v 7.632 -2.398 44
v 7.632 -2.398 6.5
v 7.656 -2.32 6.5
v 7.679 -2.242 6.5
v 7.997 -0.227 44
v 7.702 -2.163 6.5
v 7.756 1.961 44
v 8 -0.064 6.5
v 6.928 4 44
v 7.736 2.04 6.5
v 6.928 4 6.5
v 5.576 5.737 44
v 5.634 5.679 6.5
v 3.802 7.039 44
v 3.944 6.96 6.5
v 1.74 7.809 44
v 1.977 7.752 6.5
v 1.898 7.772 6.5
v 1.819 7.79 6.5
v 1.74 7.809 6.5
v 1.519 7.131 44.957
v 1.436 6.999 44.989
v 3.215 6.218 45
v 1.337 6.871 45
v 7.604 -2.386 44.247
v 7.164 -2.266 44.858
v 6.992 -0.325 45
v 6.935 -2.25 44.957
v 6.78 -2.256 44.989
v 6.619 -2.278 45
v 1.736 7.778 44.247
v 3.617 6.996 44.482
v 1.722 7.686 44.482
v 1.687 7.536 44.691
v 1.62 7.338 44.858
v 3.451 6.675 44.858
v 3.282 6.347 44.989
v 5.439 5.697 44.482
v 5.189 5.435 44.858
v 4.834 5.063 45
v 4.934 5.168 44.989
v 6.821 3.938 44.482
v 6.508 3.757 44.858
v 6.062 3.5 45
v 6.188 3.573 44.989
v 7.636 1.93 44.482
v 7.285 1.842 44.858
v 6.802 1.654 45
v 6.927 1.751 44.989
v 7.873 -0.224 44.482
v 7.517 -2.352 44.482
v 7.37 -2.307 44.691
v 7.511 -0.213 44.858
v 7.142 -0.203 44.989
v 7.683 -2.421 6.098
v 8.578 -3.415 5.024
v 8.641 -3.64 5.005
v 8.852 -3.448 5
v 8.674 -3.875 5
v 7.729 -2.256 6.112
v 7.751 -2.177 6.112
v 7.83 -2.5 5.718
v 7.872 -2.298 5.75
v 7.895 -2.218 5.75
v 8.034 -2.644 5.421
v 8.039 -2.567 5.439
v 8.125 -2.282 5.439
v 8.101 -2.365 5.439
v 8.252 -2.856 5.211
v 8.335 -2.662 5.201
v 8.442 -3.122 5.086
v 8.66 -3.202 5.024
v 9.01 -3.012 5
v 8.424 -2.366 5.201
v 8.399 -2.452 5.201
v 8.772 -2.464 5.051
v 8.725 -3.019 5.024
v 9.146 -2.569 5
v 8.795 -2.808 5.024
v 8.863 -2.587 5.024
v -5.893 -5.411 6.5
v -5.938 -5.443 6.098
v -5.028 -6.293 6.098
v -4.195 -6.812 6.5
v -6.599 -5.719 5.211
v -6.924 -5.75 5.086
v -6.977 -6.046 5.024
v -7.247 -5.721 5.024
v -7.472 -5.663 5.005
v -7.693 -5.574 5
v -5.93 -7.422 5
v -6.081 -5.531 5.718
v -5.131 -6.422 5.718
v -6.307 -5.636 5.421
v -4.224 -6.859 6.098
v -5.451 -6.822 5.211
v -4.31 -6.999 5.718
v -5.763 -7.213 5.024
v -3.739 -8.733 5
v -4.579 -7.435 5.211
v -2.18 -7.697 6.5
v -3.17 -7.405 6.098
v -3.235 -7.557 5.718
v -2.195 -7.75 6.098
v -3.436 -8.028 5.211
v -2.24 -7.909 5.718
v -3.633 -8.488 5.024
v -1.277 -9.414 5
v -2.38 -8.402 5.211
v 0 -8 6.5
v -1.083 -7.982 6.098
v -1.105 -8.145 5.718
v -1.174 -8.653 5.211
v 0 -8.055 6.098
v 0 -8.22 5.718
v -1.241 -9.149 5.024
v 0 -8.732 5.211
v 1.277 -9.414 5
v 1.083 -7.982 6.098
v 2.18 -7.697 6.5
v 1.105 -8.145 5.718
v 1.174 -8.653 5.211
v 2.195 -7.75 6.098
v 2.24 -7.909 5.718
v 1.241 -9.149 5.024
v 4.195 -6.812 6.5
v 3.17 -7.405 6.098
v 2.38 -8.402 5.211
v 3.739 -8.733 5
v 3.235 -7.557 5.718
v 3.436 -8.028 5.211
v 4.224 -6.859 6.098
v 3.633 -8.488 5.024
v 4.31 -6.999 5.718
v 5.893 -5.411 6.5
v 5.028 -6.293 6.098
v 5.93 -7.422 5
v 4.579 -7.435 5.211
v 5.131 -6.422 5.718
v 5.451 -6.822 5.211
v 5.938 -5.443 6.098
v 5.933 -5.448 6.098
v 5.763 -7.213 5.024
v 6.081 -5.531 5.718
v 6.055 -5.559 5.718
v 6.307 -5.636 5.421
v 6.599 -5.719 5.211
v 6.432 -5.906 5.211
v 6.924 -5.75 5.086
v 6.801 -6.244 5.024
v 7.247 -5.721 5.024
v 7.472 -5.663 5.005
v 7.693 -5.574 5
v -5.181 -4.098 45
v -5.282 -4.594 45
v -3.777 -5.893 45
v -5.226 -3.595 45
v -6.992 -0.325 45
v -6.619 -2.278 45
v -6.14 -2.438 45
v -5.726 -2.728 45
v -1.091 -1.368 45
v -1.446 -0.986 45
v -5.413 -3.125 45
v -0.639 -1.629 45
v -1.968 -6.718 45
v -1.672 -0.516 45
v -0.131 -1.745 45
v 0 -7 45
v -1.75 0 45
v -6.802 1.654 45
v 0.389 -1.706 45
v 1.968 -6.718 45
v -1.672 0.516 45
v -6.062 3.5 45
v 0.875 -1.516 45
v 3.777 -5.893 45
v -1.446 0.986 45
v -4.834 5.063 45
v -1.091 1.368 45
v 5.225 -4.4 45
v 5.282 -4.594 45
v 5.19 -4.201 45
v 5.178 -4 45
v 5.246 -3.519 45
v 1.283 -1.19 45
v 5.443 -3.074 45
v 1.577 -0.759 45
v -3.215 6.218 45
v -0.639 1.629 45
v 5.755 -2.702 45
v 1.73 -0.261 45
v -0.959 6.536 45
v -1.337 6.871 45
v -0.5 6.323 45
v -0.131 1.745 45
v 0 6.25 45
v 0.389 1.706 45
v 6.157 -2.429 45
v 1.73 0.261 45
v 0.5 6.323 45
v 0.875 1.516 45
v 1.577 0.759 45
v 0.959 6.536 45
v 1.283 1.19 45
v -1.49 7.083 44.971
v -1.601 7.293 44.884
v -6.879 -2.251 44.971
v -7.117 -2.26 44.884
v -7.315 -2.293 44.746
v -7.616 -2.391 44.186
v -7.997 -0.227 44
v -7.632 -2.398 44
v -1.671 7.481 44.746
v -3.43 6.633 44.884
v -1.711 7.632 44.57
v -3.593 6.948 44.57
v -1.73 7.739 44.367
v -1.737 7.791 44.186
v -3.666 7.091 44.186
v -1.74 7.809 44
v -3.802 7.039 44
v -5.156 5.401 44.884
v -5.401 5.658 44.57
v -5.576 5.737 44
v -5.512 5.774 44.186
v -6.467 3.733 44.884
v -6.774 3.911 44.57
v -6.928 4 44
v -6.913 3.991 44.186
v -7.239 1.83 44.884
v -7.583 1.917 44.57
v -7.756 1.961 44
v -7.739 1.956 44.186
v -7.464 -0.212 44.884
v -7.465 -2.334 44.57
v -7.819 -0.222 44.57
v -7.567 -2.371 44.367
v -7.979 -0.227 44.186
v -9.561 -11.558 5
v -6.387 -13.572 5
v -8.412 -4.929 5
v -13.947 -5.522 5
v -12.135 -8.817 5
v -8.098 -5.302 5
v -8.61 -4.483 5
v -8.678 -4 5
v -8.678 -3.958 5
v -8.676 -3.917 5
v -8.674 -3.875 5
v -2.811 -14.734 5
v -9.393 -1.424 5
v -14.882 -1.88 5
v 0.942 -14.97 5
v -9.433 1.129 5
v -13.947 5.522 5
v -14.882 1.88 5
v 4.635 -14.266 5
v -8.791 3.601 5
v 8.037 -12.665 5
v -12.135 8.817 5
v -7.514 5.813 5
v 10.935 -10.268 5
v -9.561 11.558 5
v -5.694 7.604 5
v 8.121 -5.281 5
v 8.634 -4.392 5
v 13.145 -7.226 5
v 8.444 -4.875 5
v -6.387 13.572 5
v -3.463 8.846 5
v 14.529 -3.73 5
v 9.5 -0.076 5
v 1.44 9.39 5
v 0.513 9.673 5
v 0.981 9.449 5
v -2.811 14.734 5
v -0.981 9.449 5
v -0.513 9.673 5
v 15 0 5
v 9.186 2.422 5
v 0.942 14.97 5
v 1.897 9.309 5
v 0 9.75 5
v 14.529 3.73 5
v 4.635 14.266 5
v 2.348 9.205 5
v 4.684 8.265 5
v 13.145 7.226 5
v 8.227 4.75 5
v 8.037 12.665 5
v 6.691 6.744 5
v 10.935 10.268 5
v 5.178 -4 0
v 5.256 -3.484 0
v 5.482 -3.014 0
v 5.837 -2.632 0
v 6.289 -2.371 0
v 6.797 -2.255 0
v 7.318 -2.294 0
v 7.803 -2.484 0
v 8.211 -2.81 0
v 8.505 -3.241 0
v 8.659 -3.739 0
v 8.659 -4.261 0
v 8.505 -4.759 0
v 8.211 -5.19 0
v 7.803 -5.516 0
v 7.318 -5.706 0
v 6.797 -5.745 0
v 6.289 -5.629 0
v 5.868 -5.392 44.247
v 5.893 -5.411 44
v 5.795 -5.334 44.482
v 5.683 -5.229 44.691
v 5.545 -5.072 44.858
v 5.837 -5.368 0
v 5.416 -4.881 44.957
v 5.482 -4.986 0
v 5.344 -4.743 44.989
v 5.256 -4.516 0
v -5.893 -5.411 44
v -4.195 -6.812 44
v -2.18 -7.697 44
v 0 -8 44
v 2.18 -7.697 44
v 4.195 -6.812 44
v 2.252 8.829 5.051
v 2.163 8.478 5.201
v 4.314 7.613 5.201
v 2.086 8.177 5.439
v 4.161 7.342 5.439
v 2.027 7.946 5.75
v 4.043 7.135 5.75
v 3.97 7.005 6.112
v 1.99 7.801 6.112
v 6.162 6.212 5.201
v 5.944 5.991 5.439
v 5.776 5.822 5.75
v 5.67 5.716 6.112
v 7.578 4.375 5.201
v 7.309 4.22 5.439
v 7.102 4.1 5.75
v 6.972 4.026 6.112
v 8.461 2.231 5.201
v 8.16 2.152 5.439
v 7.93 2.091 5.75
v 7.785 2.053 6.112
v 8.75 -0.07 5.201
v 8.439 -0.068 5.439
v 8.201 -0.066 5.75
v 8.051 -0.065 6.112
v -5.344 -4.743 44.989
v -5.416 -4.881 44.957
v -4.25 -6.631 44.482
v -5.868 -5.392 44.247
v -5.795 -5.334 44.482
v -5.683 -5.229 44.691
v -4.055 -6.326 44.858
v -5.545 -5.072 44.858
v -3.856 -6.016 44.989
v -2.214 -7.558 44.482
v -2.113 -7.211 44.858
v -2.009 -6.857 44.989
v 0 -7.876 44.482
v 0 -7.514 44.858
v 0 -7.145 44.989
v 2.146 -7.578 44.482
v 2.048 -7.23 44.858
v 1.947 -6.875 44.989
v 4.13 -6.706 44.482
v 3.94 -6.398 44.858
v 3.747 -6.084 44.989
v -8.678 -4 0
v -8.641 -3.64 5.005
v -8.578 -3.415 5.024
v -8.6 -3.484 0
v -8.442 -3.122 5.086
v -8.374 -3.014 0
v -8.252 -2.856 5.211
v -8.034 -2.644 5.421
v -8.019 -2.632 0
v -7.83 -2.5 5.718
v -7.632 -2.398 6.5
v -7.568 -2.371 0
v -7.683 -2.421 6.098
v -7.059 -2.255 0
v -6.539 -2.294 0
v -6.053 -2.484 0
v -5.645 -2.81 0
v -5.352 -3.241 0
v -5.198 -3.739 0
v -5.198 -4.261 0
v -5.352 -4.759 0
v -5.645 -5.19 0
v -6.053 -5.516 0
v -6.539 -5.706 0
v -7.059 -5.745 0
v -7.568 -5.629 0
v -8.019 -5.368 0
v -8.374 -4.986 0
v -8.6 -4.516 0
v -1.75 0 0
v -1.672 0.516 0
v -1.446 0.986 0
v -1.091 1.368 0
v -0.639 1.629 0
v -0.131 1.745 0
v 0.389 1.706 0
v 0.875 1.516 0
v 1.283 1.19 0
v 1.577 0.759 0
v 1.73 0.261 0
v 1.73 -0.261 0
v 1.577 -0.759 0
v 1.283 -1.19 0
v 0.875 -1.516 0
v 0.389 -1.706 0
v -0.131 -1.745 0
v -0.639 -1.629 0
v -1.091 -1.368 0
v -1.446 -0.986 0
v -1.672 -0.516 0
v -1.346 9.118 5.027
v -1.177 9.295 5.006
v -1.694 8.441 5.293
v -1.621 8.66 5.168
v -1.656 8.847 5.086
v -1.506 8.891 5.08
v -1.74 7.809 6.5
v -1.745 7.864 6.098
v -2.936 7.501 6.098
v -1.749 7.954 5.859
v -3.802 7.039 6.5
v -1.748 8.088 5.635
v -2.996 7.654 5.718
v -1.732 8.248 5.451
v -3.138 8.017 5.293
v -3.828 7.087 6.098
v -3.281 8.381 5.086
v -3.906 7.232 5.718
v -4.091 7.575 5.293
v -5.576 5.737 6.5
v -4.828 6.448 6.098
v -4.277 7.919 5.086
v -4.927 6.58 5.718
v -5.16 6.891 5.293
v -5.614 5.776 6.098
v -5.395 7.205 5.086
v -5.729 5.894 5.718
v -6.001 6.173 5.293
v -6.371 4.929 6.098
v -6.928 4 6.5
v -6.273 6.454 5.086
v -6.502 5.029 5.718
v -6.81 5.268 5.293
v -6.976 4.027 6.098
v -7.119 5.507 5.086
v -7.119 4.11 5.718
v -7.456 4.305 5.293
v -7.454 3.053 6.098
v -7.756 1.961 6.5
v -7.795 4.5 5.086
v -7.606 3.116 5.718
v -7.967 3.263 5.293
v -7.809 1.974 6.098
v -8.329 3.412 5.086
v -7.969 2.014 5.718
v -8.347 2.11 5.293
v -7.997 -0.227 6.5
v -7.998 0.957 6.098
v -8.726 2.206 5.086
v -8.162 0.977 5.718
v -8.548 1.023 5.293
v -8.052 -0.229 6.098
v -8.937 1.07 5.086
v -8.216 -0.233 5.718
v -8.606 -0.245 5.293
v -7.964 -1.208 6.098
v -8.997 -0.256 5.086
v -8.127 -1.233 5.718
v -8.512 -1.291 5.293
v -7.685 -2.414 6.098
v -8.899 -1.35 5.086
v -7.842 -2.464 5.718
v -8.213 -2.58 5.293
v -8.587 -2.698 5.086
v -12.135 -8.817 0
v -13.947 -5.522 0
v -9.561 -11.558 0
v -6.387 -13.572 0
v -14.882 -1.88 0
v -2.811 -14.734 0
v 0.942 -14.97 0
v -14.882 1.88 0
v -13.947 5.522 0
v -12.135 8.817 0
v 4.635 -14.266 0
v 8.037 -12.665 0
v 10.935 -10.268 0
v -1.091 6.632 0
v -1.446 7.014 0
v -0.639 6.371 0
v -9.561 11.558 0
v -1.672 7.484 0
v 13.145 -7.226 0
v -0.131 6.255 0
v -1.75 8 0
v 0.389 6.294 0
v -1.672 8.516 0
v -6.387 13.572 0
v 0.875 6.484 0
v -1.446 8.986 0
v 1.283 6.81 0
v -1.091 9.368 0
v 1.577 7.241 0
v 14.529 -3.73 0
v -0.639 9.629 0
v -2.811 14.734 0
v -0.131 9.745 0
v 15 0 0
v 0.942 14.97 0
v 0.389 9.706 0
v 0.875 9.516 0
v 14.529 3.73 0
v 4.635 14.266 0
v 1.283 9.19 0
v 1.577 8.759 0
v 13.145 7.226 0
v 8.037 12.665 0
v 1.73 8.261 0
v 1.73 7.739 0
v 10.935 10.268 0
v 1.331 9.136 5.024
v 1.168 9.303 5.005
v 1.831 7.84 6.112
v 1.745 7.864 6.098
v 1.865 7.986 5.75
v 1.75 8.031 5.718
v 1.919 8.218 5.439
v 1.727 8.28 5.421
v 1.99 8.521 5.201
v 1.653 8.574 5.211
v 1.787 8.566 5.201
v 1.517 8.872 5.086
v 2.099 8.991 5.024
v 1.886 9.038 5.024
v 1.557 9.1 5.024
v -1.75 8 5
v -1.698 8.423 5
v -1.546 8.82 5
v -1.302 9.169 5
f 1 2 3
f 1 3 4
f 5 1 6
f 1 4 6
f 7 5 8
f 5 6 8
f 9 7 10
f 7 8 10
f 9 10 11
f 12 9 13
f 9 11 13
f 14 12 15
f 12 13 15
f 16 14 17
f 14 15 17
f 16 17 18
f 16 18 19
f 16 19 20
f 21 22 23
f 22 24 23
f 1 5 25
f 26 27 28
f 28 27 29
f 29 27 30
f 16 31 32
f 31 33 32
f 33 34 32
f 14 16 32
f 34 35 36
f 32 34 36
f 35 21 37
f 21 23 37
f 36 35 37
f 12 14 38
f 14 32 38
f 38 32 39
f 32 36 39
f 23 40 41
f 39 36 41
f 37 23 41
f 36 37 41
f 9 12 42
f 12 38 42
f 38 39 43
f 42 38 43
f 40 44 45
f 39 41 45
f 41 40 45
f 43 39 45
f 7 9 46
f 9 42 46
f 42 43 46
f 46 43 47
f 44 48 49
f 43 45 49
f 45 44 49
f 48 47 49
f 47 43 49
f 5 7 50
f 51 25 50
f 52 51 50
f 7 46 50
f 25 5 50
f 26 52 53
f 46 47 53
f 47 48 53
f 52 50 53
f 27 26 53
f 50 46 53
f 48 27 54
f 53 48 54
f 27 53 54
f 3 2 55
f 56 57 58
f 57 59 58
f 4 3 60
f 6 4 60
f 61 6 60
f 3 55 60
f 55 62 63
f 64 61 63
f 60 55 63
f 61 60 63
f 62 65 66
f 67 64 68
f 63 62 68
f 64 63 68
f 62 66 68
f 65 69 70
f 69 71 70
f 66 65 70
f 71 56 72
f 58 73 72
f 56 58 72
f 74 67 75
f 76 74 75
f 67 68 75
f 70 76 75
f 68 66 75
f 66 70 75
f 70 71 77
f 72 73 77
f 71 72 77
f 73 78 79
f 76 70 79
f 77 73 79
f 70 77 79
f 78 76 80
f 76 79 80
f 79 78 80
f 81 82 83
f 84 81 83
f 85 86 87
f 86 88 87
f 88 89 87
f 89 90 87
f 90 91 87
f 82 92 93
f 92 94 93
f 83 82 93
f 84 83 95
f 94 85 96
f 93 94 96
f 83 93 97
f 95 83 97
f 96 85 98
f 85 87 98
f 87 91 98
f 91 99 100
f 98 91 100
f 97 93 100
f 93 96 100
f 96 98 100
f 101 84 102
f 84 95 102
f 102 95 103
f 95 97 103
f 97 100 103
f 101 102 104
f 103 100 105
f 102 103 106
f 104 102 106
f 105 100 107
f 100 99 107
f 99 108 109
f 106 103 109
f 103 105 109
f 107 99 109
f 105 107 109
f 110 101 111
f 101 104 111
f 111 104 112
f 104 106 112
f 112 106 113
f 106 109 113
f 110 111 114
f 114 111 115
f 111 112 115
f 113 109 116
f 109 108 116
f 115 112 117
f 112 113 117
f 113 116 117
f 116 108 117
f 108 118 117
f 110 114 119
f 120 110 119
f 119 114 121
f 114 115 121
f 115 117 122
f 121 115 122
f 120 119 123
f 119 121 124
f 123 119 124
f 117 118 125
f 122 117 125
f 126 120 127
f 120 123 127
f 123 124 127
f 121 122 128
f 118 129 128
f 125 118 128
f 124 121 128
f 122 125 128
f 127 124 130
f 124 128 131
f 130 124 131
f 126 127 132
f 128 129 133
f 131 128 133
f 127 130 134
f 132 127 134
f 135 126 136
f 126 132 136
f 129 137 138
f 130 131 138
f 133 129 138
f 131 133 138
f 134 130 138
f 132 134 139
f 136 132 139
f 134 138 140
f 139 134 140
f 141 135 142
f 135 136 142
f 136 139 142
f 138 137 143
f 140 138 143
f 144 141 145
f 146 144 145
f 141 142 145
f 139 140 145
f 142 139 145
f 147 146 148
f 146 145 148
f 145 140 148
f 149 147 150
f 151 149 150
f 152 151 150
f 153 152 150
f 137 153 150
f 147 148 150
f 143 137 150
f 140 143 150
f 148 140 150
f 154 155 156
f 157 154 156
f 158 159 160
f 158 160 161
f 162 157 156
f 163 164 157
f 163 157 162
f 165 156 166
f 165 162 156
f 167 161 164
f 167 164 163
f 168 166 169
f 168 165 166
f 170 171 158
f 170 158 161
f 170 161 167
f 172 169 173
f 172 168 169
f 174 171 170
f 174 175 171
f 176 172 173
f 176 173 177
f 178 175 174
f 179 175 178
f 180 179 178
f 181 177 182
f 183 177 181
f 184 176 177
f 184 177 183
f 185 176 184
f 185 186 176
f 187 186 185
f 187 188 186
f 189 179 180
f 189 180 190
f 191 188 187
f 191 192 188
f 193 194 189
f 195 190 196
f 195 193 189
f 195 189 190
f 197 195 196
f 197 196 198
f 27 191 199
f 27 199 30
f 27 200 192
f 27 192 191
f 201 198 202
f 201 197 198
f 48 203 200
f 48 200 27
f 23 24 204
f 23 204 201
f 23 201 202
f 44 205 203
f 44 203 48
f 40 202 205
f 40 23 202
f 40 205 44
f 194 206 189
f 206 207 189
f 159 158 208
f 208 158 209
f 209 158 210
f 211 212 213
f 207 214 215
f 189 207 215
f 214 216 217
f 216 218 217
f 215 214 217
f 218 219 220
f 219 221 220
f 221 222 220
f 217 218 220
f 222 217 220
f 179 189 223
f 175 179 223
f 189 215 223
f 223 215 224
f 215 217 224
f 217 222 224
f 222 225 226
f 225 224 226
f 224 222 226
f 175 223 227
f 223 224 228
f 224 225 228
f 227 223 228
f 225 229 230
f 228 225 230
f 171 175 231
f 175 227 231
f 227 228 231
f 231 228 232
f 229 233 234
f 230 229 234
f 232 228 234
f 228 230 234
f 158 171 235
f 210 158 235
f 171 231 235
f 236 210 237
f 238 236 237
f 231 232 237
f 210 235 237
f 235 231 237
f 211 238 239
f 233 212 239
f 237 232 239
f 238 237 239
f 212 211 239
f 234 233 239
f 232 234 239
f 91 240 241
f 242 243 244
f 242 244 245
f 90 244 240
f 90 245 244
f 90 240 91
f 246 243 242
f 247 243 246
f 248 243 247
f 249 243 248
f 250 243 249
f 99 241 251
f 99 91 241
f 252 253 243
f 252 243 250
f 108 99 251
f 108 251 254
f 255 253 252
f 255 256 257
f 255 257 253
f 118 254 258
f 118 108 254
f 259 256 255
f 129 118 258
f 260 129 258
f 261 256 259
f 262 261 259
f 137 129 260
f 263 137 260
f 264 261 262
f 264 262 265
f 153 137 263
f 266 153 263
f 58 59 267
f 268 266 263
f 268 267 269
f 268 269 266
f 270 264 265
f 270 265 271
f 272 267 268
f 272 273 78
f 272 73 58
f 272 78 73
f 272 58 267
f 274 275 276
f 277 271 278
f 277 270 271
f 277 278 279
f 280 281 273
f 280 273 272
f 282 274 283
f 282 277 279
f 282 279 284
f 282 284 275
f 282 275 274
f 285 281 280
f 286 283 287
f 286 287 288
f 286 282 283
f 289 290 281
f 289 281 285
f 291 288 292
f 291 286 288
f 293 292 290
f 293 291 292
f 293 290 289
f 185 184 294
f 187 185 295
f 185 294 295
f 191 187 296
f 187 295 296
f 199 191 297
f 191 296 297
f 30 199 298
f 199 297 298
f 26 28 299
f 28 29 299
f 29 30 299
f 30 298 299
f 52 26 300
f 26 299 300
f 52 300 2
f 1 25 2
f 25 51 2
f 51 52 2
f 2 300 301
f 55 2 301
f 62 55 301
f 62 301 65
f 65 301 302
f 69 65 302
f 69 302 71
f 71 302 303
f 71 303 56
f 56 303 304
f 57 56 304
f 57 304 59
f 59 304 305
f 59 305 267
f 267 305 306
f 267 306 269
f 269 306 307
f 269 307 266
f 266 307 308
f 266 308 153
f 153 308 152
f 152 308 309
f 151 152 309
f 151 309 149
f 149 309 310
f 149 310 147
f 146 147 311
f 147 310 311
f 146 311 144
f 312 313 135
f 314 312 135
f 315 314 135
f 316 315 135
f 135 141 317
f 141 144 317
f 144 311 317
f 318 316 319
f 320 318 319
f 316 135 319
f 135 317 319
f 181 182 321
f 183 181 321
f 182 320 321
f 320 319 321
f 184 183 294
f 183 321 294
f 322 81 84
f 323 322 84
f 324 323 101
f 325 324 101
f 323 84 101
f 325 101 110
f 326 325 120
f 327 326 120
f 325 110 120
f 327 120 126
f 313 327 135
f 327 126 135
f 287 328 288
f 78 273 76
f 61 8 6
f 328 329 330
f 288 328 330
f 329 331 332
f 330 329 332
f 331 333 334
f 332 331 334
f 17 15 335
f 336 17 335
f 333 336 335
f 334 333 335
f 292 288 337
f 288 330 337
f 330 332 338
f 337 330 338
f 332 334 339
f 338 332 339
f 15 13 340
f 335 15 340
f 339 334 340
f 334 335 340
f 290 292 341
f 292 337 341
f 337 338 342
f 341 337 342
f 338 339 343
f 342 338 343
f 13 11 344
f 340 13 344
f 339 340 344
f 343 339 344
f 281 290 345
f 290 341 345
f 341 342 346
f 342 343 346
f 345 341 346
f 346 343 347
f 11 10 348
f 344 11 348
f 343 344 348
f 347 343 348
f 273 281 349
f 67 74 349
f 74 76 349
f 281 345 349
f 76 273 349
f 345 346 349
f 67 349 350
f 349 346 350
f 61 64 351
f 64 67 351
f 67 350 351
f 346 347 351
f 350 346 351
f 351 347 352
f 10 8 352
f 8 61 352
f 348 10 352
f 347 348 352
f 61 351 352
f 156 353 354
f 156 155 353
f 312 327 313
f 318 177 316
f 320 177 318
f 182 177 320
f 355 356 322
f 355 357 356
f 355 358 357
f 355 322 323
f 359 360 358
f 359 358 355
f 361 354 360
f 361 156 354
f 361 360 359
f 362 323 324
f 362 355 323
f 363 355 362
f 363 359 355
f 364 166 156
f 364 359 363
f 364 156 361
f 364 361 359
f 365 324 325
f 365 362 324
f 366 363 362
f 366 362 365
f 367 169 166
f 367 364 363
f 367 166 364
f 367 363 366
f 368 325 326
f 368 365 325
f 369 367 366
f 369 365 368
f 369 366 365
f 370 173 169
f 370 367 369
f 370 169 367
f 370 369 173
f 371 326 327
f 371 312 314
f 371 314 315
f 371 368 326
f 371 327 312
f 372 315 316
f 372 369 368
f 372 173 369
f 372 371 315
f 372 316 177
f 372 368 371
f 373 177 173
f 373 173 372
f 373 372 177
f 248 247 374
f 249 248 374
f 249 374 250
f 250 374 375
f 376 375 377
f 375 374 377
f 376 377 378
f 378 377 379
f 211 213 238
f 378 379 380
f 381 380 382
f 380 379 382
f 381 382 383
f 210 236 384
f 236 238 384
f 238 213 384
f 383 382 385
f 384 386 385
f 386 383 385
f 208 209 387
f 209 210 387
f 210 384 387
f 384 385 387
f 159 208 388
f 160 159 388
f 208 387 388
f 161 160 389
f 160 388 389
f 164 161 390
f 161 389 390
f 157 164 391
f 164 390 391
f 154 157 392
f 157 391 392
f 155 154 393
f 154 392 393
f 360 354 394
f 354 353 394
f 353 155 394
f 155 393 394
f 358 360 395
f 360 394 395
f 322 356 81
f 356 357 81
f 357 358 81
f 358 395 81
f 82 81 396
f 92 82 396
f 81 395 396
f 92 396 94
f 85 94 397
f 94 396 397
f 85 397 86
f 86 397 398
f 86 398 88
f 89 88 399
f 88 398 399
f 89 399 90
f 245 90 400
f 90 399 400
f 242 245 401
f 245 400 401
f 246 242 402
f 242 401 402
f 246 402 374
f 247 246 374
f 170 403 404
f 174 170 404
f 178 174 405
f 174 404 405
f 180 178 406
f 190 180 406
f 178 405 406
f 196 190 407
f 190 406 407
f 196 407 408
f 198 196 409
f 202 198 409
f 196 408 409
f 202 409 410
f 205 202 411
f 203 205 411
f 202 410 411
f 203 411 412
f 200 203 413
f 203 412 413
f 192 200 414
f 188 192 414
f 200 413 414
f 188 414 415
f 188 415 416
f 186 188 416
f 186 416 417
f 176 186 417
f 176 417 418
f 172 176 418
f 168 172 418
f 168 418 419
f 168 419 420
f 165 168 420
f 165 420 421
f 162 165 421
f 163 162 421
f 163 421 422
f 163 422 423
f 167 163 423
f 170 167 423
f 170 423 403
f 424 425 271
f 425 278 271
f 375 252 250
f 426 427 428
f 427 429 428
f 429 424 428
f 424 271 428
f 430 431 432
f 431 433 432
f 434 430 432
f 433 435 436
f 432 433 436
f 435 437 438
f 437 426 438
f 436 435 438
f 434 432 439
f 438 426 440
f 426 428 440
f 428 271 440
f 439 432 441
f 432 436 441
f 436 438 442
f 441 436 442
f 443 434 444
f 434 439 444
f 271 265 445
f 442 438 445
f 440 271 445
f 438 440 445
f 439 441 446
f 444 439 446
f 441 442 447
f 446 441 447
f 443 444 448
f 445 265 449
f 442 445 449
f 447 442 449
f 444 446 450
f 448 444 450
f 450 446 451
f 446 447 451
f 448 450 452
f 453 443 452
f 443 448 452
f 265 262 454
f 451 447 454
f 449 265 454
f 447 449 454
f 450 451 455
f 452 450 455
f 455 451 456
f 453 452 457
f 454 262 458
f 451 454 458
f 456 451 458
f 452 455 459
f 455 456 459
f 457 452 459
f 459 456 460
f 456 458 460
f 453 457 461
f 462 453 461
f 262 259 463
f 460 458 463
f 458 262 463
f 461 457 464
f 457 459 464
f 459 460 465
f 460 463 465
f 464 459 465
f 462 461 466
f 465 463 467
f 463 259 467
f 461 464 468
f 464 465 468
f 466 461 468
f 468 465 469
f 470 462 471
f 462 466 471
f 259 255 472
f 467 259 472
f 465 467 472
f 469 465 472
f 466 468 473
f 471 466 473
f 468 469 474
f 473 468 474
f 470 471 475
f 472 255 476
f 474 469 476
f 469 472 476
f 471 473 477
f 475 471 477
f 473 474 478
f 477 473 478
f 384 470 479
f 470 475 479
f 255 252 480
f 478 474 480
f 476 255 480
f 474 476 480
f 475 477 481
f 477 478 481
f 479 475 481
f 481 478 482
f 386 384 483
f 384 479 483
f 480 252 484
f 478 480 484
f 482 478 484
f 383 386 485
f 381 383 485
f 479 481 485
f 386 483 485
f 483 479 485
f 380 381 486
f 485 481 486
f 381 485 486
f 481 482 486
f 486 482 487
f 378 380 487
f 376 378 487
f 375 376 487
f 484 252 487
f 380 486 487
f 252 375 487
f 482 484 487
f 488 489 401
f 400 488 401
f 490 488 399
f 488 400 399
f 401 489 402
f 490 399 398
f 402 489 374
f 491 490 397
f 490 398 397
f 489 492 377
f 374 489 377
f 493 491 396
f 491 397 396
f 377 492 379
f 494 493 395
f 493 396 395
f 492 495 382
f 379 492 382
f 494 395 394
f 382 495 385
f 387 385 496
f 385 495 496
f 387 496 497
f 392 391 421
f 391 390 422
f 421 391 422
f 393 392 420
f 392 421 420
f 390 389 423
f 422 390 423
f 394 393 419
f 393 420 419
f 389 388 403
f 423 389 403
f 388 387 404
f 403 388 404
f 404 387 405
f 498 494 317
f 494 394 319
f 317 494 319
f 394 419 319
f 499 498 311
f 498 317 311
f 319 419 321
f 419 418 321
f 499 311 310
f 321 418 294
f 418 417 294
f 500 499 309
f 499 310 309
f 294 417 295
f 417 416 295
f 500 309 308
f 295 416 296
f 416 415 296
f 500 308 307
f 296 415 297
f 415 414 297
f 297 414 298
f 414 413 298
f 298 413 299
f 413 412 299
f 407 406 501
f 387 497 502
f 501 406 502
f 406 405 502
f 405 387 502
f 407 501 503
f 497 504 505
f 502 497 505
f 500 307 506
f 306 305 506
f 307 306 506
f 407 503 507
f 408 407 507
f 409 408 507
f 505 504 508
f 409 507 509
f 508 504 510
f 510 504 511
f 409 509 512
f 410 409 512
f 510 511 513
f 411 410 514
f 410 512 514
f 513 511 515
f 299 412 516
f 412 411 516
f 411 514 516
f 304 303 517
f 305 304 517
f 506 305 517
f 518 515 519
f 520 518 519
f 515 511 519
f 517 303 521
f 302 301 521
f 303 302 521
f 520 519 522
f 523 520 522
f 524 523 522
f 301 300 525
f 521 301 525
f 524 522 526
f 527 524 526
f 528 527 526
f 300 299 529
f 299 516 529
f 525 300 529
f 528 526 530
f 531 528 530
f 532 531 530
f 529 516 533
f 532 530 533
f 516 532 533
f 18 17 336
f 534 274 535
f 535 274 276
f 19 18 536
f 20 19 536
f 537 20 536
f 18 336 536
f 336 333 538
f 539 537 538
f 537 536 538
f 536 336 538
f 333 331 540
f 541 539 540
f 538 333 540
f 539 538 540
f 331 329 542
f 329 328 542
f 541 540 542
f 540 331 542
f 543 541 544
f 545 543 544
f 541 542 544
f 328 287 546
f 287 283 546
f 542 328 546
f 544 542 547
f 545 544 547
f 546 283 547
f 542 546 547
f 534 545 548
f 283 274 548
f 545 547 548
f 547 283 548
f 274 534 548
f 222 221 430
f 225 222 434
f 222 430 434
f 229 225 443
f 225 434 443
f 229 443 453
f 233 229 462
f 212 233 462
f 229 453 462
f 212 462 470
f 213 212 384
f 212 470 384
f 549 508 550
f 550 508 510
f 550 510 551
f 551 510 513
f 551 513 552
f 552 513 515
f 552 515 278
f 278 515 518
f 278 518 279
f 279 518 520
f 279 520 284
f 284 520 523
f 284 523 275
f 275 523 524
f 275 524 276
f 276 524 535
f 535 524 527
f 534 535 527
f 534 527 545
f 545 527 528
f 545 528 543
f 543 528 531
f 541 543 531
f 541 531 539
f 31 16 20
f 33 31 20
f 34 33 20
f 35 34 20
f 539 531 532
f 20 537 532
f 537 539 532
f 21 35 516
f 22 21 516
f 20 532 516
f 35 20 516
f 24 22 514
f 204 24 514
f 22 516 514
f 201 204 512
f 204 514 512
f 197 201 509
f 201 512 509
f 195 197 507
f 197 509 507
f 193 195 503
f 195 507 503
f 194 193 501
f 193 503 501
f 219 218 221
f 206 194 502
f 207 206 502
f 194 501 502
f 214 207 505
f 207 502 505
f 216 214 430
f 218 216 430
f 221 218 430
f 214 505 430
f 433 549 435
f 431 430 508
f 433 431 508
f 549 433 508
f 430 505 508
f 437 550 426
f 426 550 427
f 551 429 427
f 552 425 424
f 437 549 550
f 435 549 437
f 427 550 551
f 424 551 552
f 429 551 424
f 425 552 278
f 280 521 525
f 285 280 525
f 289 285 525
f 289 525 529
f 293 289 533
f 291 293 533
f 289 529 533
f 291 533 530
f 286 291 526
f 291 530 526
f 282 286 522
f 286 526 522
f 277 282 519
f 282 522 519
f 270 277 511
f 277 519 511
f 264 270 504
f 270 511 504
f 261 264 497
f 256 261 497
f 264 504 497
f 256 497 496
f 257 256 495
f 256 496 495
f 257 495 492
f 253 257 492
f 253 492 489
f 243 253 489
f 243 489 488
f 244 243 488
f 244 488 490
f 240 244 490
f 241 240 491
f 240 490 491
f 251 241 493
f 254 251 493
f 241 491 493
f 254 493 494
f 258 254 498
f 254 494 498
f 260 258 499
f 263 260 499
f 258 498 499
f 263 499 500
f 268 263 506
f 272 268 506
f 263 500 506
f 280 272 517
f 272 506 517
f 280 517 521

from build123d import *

# Parameters (mm, degrees)
SKETCH_1_R          = 15
EXTRUDE_1_DEPTH     = 5
SKETCH_2_R          = 8
EXTRUDE_2_DEPTH     = 40
SKETCH_3_R          = 1.75
CUT_EXTRUDE_1_DEPTH = 49
FILLET_1_R          = 1.5
FILLET_2_R          = 1


with BuildPart() as part:
    # 草图1 → 凸台-拉伸1 (new body)
    with BuildSketch(Plane.XY):
        Circle(SKETCH_1_R)
    extrude(amount=EXTRUDE_1_DEPTH)

    # 草图2 → 凸台-拉伸2 (add)
    with BuildSketch(Plane.XY.offset(5)):
        Circle(SKETCH_2_R)
    extrude(amount=EXTRUDE_2_DEPTH)

    # 草图3 → 切除-拉伸1 (cut)
    with BuildSketch(Plane(origin=(0, 0, 0), x_dir=(-1, 0, 0), z_dir=(0, 0, -1))):
        with Locations((0, 8)):
            Circle(SKETCH_3_R)
        Circle(SKETCH_3_R)
        with Locations((6.92820323, -4)):
            Circle(SKETCH_3_R)
        with Locations((-6.92820323, -4)):
            Circle(SKETCH_3_R)
    extrude(amount=-CUT_EXTRUDE_1_DEPTH, mode=Mode.SUBTRACT)

    # 圆角1
    # the kernel refuses this fillet: 1.5 mm, written as the material it adds along each edge
    with BuildSketch(Plane(origin=(0, 0, 5), x_dir=(0.24718186036796463, 0.968969105753652, 0), z_dir=(0.968969105753652, -0.24718186036796463, 0))) as fillet_1_piece_1_section:
        with BuildLine():
            CenterArc((8 + FILLET_1_R, FILLET_1_R), FILLET_1_R, 180, 90)
            Line((8, FILLET_1_R), (8, 0))
            Line((8, 0), (8 + FILLET_1_R, 0))
        make_face()
    fillet_1_piece_1 = revolve(axis=Axis((0, 0, 5), (0, 0, 1)), revolution_arc=148.621623282, mode=Mode.PRIVATE)
    fillet_1_piece_1 = fillet_1_piece_1 - Plane(origin=(-6.92820323, -4, 5.2649635), x_dir=(-1, 0, 0), z_dir=(0, 0, -1)) * Cylinder(1.75, 39, mode=Mode.PRIVATE)
    fillet_1_piece_1 = fillet_1_piece_1 - Plane(origin=(0, 8, 5.2649635), x_dir=(-1, 0, 0), z_dir=(0, 0, -1)) * Cylinder(1.75, 39, mode=Mode.PRIVATE)
    add(fillet_1_piece_1)
    with BuildSketch(Plane(origin=(0, 0, 5), x_dir=(-0.9627427912489371, -0.27041878244346385, 0), z_dir=(-0.27041878244346385, 0.9627427912489371, 0))) as fillet_1_piece_2_section:
        with BuildLine():
            CenterArc((8 + FILLET_1_R, FILLET_1_R), FILLET_1_R, 180, 90)
            Line((8, FILLET_1_R), (8, 0))
            Line((8, 0), (8 + FILLET_1_R, 0))
        make_face()
    fillet_1_piece_2 = revolve(axis=Axis((0, 0, 5), (0, 0, 1)), revolution_arc=148.621623282, mode=Mode.PRIVATE)
    fillet_1_piece_2 = fillet_1_piece_2 - Plane(origin=(6.92820323, -4, 5.2649635), x_dir=(-1, 0, 0), z_dir=(0, 0, -1)) * Cylinder(1.75, 39, mode=Mode.PRIVATE)
    fillet_1_piece_2 = fillet_1_piece_2 - Plane(origin=(-6.92820323, -4, 5.2649635), x_dir=(-1, 0, 0), z_dir=(0, 0, -1)) * Cylinder(1.75, 39, mode=Mode.PRIVATE)
    add(fillet_1_piece_2)
    with BuildSketch(Plane(origin=(0, 0, 5), x_dir=(-0.24718186036796455, 0.968969105753652, 0), z_dir=(-0.968969105753652, -0.24718186036796455, 0))) as fillet_1_piece_3_section:
        with BuildLine():
            CenterArc((8 + FILLET_1_R, -FILLET_1_R), FILLET_1_R, 90, 90)
            Line((8, -FILLET_1_R), (8, 0))
            Line((8, 0), (8 + FILLET_1_R, 0))
        make_face()
    fillet_1_piece_3 = revolve(axis=Axis((0, 0, 5), (0, 0, -1)), revolution_arc=148.621623282, mode=Mode.PRIVATE)
    fillet_1_piece_3 = fillet_1_piece_3 - Plane(origin=(6.92820323, -4, 5.264963506), x_dir=(-1, 0, 0), z_dir=(0, 0, -1)) * Cylinder(1.75, 39, mode=Mode.PRIVATE)
    fillet_1_piece_3 = fillet_1_piece_3 - Plane(origin=(0, 8, 5.264963506), x_dir=(-1, 0, 0), z_dir=(0, 0, -1)) * Cylinder(1.75, 39, mode=Mode.PRIVATE)
    add(fillet_1_piece_3)

    # 圆角2
    fillet_2_edges = [part.edges().sort_by_distance(p)[0] for p in [
        (-6.92820323, 4, 45),
        (0, -8, 45),
        (6.92820323, 4, 45),
    ]]
    fillet(fillet_2_edges, radius=FILLET_2_R)


solid = part.part
